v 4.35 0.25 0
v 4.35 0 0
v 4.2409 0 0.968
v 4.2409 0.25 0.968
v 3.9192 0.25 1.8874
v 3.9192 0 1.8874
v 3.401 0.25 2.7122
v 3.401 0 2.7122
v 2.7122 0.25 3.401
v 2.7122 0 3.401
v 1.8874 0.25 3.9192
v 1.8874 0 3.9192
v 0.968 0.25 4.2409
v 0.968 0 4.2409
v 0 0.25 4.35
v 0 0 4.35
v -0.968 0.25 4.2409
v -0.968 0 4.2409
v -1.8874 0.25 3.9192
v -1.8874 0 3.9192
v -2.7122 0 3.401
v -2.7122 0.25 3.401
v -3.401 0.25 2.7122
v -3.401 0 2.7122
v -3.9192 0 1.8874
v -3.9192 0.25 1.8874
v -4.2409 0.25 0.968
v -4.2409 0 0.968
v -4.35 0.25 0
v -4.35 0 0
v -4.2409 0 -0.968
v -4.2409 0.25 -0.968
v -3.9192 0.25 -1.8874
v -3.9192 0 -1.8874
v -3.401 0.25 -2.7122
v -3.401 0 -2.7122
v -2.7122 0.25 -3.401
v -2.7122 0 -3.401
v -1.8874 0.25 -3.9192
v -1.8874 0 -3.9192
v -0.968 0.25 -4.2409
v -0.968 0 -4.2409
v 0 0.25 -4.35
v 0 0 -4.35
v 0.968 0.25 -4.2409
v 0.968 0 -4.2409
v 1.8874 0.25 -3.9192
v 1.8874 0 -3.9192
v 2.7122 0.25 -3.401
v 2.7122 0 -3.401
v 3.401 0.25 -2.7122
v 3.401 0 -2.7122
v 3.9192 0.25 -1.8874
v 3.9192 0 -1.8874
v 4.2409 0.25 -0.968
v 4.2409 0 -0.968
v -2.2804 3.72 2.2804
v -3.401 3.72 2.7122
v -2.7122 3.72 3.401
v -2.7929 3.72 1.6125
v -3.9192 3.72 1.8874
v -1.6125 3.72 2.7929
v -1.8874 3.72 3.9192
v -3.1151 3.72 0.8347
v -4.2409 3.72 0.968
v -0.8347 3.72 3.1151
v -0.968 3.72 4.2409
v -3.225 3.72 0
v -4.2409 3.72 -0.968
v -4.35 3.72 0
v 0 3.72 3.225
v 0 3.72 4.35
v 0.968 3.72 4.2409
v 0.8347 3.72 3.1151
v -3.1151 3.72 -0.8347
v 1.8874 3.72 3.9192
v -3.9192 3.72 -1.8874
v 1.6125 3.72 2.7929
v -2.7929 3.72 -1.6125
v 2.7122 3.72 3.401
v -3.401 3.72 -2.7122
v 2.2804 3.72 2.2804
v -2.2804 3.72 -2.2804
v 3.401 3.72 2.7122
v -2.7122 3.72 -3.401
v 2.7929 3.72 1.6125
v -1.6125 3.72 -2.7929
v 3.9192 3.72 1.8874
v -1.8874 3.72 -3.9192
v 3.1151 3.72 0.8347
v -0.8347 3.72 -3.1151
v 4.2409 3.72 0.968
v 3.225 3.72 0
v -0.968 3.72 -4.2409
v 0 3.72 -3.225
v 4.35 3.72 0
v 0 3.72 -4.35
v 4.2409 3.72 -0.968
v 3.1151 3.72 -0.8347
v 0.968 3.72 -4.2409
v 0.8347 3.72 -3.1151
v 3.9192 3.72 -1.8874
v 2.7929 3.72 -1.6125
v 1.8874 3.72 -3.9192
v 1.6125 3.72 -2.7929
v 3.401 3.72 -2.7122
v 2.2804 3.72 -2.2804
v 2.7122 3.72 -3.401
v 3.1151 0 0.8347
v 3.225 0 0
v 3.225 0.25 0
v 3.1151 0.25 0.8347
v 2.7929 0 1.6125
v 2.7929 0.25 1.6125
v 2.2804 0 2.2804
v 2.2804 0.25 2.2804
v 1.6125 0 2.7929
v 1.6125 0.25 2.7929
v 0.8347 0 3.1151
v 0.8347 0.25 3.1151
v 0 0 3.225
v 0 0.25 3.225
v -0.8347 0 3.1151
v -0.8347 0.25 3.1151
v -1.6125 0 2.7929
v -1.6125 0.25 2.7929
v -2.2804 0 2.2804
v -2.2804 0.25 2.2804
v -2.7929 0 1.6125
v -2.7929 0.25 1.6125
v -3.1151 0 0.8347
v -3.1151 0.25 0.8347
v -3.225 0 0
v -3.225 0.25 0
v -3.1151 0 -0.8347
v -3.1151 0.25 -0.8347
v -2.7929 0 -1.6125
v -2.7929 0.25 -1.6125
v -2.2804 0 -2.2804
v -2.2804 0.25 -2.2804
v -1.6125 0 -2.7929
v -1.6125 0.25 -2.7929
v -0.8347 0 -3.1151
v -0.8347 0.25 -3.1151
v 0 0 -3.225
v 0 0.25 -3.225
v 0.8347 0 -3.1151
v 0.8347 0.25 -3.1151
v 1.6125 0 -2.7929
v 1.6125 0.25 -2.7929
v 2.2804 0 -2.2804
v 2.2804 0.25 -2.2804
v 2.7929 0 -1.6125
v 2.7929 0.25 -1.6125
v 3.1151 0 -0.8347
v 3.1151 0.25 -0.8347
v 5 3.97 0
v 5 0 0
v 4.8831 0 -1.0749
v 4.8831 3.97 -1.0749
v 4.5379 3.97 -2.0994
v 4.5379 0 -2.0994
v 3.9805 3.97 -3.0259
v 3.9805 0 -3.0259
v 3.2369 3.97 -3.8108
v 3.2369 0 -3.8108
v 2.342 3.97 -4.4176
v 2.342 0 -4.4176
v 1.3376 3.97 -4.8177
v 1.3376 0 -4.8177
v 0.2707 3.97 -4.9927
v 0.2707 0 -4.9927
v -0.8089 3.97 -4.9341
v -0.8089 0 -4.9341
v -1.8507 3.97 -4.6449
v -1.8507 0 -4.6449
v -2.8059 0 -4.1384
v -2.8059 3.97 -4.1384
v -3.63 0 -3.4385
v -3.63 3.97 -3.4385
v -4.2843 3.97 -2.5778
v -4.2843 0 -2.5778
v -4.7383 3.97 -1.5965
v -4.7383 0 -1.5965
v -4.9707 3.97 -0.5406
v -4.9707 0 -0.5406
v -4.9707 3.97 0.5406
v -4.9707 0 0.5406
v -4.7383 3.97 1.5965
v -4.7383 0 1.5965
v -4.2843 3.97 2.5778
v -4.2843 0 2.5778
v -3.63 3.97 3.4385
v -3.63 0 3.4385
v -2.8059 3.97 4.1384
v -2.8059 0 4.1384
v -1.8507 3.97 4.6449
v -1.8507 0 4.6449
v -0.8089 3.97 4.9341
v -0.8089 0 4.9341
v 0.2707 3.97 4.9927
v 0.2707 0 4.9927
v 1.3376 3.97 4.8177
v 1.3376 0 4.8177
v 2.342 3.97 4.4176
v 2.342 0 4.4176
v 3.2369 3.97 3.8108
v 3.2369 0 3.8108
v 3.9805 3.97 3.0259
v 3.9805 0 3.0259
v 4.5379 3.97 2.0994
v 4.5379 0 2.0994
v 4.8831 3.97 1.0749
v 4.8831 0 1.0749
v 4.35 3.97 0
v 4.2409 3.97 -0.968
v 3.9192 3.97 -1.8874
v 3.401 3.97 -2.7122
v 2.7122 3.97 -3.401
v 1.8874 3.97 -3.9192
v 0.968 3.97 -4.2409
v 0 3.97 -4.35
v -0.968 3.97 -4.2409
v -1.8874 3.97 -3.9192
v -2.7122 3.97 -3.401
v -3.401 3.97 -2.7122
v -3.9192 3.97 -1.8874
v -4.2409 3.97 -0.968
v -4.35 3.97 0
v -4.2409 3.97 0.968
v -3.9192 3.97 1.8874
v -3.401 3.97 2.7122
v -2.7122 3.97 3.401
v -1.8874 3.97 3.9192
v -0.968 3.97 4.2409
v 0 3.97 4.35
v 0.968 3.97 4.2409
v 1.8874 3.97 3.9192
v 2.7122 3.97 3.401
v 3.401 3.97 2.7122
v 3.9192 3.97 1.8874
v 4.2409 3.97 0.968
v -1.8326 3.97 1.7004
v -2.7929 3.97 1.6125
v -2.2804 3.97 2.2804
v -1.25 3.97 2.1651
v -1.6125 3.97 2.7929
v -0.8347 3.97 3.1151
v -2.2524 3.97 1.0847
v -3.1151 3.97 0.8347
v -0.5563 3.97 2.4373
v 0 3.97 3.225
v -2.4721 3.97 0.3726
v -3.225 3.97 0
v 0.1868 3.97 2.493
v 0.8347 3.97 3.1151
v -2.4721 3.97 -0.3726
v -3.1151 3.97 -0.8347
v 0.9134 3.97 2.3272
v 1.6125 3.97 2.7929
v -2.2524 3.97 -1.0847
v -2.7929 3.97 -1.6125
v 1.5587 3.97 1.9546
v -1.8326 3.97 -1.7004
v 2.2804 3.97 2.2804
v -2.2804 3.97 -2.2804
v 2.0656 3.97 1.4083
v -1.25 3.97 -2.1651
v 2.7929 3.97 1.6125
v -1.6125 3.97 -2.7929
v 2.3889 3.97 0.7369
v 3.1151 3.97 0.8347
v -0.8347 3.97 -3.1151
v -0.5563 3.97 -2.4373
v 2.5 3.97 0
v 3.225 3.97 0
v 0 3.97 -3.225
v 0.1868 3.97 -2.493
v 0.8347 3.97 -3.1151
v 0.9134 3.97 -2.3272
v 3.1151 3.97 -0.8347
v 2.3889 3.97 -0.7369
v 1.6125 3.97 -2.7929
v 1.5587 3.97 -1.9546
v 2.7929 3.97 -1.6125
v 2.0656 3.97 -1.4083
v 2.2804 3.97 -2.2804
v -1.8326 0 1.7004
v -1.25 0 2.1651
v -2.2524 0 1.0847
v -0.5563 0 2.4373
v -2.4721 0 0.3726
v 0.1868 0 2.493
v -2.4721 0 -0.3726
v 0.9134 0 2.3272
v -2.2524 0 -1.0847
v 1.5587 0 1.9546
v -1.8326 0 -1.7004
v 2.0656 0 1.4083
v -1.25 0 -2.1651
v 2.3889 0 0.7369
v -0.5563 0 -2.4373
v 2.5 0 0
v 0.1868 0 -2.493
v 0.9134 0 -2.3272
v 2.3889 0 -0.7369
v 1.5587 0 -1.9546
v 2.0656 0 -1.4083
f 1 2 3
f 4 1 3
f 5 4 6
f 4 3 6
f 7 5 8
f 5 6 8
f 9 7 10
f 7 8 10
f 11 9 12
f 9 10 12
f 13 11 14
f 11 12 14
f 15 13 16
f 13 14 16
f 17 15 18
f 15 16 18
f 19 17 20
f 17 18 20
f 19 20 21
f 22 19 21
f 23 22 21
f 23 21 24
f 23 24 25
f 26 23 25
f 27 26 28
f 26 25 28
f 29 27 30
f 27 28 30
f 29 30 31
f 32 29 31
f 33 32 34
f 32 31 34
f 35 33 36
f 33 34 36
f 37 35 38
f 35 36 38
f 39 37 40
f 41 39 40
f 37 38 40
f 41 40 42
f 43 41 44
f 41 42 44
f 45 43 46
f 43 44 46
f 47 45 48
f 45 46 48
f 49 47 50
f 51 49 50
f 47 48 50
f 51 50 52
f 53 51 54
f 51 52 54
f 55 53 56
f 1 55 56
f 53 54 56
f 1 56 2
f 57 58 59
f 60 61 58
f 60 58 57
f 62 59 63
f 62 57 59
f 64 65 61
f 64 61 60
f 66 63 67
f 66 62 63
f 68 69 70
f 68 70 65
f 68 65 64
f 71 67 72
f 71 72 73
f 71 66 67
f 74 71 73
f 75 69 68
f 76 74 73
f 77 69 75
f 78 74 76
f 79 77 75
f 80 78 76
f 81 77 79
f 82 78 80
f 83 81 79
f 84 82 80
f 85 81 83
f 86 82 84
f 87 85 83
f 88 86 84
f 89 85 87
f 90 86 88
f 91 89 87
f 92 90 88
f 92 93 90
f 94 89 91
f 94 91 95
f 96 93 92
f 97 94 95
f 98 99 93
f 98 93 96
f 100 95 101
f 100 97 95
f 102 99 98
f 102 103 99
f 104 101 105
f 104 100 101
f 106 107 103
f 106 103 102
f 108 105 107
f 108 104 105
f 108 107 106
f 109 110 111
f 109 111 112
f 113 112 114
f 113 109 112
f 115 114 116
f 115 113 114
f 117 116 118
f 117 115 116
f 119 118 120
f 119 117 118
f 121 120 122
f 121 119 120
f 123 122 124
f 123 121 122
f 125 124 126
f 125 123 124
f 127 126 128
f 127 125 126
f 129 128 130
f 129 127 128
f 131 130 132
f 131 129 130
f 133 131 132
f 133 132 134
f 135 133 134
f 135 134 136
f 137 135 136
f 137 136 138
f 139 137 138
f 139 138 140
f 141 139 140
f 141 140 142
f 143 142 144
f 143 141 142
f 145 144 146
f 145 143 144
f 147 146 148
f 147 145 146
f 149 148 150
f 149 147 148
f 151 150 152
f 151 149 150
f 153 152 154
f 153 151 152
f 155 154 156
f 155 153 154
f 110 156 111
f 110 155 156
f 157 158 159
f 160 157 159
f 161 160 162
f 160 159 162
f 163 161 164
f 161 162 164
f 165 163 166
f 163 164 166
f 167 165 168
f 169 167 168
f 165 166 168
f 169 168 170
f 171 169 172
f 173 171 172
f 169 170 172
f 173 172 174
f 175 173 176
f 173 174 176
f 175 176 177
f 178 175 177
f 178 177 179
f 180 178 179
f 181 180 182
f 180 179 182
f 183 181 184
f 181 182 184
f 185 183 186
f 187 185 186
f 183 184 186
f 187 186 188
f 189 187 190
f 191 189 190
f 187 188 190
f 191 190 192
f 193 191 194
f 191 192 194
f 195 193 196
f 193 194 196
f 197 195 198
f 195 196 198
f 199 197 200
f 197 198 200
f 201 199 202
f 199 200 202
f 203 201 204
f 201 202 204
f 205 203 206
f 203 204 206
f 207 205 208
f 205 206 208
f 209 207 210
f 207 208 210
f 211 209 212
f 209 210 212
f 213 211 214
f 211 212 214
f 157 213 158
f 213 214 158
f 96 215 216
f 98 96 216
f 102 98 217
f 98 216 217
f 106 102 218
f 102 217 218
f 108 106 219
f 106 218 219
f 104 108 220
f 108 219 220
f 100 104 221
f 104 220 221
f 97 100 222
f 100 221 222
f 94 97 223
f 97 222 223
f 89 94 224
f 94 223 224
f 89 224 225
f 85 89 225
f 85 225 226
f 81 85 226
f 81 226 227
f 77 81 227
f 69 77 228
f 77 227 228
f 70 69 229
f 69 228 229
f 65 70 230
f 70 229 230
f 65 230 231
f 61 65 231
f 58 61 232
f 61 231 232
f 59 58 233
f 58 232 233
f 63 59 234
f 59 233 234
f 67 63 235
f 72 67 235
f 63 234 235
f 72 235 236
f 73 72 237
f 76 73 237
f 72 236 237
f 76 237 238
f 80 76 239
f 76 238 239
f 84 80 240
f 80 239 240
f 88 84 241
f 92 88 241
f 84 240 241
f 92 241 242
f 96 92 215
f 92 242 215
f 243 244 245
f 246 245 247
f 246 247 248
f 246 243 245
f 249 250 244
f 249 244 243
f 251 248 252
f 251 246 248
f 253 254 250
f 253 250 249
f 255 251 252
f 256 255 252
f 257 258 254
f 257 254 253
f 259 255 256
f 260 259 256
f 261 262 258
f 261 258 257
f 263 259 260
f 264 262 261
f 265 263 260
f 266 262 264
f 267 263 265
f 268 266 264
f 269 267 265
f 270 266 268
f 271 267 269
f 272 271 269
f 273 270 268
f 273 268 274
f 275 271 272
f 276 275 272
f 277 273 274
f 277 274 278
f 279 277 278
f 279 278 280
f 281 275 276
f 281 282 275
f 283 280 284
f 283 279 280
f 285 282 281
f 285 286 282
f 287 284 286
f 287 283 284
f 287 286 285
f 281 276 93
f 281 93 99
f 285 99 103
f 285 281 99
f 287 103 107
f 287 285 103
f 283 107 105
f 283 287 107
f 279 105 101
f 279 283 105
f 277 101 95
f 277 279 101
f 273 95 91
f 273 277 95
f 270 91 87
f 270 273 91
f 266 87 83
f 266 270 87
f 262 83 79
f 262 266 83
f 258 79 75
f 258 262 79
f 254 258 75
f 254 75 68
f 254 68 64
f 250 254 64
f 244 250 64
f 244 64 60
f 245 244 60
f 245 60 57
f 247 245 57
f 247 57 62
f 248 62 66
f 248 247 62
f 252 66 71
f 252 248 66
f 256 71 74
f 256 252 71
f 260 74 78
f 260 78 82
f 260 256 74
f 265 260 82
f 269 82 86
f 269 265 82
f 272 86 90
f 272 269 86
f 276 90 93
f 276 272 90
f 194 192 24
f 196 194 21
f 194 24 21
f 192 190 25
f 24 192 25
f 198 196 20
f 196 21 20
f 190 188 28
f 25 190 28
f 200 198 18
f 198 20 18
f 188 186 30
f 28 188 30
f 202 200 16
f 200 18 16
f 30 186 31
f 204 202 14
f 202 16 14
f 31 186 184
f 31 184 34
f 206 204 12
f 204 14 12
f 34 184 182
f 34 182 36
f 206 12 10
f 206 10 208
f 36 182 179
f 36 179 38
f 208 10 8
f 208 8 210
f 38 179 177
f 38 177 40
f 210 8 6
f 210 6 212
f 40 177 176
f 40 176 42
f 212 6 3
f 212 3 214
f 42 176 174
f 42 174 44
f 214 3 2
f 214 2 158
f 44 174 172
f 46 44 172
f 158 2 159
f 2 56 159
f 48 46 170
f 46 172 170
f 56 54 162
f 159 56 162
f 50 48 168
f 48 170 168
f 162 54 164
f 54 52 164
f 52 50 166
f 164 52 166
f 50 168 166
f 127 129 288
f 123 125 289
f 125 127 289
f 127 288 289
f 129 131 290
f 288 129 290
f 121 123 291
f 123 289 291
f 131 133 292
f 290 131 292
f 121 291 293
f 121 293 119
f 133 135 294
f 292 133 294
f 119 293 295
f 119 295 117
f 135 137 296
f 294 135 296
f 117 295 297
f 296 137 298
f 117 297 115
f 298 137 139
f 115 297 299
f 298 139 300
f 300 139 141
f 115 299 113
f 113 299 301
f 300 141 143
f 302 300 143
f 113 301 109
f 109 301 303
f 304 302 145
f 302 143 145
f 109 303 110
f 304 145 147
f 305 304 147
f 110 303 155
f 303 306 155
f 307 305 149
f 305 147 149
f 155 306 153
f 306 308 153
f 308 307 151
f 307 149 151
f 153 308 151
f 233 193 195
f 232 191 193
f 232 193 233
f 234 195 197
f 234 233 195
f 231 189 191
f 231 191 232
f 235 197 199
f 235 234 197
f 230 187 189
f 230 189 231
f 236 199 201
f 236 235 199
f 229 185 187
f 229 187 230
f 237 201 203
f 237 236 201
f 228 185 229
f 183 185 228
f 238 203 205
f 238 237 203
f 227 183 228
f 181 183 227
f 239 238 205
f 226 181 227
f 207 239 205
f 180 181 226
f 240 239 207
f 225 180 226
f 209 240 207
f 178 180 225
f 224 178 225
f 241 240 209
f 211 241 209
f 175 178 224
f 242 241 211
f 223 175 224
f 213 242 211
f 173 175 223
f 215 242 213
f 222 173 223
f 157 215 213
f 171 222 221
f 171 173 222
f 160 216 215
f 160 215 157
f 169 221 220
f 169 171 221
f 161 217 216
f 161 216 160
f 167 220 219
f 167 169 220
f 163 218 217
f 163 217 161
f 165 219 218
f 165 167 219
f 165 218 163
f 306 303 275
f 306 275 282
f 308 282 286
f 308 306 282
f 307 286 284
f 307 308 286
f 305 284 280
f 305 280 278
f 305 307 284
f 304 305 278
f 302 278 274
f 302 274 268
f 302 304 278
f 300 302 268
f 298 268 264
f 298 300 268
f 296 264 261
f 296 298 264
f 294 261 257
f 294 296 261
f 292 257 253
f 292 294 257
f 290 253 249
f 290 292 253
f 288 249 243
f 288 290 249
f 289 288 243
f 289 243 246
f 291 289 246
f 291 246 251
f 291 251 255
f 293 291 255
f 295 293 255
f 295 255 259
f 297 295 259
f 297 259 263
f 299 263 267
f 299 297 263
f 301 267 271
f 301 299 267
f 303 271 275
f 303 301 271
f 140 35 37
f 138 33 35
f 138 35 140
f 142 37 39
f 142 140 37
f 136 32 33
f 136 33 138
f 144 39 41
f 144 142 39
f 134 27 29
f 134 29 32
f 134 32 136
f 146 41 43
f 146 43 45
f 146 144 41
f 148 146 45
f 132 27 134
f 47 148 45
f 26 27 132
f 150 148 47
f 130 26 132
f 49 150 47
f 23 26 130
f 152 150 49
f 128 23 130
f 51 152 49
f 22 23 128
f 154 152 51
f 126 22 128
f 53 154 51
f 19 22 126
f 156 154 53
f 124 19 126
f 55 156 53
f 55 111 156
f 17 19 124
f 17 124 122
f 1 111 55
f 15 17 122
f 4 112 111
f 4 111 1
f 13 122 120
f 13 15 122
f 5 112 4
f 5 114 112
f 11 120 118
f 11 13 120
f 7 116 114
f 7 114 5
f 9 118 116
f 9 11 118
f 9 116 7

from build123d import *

# Parameters (mm, degrees)
SKETCH1_R           = 5
SKETCH1_R_2         = 2.5
BOSS_EXTRUDE1_DEPTH = 3.97
SKETCH2_R           = 4.35
SKETCH2_R_2         = 3.225
CUT_EXTRUDE1_DEPTH  = 0.25
SKETCH3_R           = 4.35
SKETCH3_R_2         = 3.225
CUT_EXTRUDE2_DEPTH  = 0.25


with BuildPart() as part:
    # Sketch1 → Boss-Extrude1 (new body)
    with BuildSketch(Plane(origin=(0, 0, 0), x_dir=(1, 0, 0), z_dir=(0, 1, 0))):
        Circle(SKETCH1_R)
        Circle(SKETCH1_R_2, mode=Mode.SUBTRACT)
    extrude(amount=BOSS_EXTRUDE1_DEPTH)

    # Sketch2 → Cut-Extrude1 (cut)
    with BuildSketch(Plane(origin=(0, 3.97, 0), x_dir=(1, 0, 0), z_dir=(0, 1, 0))):
        Circle(SKETCH2_R)
        Circle(SKETCH2_R_2, mode=Mode.SUBTRACT)
    extrude(amount=-CUT_EXTRUDE1_DEPTH, mode=Mode.SUBTRACT)

    # Sketch3 → Cut-Extrude2 (cut)
    with BuildSketch(Plane.XZ):
        Circle(SKETCH3_R)
        Circle(SKETCH3_R_2, mode=Mode.SUBTRACT)
    extrude(amount=-CUT_EXTRUDE2_DEPTH, mode=Mode.SUBTRACT)


solid = part.part
